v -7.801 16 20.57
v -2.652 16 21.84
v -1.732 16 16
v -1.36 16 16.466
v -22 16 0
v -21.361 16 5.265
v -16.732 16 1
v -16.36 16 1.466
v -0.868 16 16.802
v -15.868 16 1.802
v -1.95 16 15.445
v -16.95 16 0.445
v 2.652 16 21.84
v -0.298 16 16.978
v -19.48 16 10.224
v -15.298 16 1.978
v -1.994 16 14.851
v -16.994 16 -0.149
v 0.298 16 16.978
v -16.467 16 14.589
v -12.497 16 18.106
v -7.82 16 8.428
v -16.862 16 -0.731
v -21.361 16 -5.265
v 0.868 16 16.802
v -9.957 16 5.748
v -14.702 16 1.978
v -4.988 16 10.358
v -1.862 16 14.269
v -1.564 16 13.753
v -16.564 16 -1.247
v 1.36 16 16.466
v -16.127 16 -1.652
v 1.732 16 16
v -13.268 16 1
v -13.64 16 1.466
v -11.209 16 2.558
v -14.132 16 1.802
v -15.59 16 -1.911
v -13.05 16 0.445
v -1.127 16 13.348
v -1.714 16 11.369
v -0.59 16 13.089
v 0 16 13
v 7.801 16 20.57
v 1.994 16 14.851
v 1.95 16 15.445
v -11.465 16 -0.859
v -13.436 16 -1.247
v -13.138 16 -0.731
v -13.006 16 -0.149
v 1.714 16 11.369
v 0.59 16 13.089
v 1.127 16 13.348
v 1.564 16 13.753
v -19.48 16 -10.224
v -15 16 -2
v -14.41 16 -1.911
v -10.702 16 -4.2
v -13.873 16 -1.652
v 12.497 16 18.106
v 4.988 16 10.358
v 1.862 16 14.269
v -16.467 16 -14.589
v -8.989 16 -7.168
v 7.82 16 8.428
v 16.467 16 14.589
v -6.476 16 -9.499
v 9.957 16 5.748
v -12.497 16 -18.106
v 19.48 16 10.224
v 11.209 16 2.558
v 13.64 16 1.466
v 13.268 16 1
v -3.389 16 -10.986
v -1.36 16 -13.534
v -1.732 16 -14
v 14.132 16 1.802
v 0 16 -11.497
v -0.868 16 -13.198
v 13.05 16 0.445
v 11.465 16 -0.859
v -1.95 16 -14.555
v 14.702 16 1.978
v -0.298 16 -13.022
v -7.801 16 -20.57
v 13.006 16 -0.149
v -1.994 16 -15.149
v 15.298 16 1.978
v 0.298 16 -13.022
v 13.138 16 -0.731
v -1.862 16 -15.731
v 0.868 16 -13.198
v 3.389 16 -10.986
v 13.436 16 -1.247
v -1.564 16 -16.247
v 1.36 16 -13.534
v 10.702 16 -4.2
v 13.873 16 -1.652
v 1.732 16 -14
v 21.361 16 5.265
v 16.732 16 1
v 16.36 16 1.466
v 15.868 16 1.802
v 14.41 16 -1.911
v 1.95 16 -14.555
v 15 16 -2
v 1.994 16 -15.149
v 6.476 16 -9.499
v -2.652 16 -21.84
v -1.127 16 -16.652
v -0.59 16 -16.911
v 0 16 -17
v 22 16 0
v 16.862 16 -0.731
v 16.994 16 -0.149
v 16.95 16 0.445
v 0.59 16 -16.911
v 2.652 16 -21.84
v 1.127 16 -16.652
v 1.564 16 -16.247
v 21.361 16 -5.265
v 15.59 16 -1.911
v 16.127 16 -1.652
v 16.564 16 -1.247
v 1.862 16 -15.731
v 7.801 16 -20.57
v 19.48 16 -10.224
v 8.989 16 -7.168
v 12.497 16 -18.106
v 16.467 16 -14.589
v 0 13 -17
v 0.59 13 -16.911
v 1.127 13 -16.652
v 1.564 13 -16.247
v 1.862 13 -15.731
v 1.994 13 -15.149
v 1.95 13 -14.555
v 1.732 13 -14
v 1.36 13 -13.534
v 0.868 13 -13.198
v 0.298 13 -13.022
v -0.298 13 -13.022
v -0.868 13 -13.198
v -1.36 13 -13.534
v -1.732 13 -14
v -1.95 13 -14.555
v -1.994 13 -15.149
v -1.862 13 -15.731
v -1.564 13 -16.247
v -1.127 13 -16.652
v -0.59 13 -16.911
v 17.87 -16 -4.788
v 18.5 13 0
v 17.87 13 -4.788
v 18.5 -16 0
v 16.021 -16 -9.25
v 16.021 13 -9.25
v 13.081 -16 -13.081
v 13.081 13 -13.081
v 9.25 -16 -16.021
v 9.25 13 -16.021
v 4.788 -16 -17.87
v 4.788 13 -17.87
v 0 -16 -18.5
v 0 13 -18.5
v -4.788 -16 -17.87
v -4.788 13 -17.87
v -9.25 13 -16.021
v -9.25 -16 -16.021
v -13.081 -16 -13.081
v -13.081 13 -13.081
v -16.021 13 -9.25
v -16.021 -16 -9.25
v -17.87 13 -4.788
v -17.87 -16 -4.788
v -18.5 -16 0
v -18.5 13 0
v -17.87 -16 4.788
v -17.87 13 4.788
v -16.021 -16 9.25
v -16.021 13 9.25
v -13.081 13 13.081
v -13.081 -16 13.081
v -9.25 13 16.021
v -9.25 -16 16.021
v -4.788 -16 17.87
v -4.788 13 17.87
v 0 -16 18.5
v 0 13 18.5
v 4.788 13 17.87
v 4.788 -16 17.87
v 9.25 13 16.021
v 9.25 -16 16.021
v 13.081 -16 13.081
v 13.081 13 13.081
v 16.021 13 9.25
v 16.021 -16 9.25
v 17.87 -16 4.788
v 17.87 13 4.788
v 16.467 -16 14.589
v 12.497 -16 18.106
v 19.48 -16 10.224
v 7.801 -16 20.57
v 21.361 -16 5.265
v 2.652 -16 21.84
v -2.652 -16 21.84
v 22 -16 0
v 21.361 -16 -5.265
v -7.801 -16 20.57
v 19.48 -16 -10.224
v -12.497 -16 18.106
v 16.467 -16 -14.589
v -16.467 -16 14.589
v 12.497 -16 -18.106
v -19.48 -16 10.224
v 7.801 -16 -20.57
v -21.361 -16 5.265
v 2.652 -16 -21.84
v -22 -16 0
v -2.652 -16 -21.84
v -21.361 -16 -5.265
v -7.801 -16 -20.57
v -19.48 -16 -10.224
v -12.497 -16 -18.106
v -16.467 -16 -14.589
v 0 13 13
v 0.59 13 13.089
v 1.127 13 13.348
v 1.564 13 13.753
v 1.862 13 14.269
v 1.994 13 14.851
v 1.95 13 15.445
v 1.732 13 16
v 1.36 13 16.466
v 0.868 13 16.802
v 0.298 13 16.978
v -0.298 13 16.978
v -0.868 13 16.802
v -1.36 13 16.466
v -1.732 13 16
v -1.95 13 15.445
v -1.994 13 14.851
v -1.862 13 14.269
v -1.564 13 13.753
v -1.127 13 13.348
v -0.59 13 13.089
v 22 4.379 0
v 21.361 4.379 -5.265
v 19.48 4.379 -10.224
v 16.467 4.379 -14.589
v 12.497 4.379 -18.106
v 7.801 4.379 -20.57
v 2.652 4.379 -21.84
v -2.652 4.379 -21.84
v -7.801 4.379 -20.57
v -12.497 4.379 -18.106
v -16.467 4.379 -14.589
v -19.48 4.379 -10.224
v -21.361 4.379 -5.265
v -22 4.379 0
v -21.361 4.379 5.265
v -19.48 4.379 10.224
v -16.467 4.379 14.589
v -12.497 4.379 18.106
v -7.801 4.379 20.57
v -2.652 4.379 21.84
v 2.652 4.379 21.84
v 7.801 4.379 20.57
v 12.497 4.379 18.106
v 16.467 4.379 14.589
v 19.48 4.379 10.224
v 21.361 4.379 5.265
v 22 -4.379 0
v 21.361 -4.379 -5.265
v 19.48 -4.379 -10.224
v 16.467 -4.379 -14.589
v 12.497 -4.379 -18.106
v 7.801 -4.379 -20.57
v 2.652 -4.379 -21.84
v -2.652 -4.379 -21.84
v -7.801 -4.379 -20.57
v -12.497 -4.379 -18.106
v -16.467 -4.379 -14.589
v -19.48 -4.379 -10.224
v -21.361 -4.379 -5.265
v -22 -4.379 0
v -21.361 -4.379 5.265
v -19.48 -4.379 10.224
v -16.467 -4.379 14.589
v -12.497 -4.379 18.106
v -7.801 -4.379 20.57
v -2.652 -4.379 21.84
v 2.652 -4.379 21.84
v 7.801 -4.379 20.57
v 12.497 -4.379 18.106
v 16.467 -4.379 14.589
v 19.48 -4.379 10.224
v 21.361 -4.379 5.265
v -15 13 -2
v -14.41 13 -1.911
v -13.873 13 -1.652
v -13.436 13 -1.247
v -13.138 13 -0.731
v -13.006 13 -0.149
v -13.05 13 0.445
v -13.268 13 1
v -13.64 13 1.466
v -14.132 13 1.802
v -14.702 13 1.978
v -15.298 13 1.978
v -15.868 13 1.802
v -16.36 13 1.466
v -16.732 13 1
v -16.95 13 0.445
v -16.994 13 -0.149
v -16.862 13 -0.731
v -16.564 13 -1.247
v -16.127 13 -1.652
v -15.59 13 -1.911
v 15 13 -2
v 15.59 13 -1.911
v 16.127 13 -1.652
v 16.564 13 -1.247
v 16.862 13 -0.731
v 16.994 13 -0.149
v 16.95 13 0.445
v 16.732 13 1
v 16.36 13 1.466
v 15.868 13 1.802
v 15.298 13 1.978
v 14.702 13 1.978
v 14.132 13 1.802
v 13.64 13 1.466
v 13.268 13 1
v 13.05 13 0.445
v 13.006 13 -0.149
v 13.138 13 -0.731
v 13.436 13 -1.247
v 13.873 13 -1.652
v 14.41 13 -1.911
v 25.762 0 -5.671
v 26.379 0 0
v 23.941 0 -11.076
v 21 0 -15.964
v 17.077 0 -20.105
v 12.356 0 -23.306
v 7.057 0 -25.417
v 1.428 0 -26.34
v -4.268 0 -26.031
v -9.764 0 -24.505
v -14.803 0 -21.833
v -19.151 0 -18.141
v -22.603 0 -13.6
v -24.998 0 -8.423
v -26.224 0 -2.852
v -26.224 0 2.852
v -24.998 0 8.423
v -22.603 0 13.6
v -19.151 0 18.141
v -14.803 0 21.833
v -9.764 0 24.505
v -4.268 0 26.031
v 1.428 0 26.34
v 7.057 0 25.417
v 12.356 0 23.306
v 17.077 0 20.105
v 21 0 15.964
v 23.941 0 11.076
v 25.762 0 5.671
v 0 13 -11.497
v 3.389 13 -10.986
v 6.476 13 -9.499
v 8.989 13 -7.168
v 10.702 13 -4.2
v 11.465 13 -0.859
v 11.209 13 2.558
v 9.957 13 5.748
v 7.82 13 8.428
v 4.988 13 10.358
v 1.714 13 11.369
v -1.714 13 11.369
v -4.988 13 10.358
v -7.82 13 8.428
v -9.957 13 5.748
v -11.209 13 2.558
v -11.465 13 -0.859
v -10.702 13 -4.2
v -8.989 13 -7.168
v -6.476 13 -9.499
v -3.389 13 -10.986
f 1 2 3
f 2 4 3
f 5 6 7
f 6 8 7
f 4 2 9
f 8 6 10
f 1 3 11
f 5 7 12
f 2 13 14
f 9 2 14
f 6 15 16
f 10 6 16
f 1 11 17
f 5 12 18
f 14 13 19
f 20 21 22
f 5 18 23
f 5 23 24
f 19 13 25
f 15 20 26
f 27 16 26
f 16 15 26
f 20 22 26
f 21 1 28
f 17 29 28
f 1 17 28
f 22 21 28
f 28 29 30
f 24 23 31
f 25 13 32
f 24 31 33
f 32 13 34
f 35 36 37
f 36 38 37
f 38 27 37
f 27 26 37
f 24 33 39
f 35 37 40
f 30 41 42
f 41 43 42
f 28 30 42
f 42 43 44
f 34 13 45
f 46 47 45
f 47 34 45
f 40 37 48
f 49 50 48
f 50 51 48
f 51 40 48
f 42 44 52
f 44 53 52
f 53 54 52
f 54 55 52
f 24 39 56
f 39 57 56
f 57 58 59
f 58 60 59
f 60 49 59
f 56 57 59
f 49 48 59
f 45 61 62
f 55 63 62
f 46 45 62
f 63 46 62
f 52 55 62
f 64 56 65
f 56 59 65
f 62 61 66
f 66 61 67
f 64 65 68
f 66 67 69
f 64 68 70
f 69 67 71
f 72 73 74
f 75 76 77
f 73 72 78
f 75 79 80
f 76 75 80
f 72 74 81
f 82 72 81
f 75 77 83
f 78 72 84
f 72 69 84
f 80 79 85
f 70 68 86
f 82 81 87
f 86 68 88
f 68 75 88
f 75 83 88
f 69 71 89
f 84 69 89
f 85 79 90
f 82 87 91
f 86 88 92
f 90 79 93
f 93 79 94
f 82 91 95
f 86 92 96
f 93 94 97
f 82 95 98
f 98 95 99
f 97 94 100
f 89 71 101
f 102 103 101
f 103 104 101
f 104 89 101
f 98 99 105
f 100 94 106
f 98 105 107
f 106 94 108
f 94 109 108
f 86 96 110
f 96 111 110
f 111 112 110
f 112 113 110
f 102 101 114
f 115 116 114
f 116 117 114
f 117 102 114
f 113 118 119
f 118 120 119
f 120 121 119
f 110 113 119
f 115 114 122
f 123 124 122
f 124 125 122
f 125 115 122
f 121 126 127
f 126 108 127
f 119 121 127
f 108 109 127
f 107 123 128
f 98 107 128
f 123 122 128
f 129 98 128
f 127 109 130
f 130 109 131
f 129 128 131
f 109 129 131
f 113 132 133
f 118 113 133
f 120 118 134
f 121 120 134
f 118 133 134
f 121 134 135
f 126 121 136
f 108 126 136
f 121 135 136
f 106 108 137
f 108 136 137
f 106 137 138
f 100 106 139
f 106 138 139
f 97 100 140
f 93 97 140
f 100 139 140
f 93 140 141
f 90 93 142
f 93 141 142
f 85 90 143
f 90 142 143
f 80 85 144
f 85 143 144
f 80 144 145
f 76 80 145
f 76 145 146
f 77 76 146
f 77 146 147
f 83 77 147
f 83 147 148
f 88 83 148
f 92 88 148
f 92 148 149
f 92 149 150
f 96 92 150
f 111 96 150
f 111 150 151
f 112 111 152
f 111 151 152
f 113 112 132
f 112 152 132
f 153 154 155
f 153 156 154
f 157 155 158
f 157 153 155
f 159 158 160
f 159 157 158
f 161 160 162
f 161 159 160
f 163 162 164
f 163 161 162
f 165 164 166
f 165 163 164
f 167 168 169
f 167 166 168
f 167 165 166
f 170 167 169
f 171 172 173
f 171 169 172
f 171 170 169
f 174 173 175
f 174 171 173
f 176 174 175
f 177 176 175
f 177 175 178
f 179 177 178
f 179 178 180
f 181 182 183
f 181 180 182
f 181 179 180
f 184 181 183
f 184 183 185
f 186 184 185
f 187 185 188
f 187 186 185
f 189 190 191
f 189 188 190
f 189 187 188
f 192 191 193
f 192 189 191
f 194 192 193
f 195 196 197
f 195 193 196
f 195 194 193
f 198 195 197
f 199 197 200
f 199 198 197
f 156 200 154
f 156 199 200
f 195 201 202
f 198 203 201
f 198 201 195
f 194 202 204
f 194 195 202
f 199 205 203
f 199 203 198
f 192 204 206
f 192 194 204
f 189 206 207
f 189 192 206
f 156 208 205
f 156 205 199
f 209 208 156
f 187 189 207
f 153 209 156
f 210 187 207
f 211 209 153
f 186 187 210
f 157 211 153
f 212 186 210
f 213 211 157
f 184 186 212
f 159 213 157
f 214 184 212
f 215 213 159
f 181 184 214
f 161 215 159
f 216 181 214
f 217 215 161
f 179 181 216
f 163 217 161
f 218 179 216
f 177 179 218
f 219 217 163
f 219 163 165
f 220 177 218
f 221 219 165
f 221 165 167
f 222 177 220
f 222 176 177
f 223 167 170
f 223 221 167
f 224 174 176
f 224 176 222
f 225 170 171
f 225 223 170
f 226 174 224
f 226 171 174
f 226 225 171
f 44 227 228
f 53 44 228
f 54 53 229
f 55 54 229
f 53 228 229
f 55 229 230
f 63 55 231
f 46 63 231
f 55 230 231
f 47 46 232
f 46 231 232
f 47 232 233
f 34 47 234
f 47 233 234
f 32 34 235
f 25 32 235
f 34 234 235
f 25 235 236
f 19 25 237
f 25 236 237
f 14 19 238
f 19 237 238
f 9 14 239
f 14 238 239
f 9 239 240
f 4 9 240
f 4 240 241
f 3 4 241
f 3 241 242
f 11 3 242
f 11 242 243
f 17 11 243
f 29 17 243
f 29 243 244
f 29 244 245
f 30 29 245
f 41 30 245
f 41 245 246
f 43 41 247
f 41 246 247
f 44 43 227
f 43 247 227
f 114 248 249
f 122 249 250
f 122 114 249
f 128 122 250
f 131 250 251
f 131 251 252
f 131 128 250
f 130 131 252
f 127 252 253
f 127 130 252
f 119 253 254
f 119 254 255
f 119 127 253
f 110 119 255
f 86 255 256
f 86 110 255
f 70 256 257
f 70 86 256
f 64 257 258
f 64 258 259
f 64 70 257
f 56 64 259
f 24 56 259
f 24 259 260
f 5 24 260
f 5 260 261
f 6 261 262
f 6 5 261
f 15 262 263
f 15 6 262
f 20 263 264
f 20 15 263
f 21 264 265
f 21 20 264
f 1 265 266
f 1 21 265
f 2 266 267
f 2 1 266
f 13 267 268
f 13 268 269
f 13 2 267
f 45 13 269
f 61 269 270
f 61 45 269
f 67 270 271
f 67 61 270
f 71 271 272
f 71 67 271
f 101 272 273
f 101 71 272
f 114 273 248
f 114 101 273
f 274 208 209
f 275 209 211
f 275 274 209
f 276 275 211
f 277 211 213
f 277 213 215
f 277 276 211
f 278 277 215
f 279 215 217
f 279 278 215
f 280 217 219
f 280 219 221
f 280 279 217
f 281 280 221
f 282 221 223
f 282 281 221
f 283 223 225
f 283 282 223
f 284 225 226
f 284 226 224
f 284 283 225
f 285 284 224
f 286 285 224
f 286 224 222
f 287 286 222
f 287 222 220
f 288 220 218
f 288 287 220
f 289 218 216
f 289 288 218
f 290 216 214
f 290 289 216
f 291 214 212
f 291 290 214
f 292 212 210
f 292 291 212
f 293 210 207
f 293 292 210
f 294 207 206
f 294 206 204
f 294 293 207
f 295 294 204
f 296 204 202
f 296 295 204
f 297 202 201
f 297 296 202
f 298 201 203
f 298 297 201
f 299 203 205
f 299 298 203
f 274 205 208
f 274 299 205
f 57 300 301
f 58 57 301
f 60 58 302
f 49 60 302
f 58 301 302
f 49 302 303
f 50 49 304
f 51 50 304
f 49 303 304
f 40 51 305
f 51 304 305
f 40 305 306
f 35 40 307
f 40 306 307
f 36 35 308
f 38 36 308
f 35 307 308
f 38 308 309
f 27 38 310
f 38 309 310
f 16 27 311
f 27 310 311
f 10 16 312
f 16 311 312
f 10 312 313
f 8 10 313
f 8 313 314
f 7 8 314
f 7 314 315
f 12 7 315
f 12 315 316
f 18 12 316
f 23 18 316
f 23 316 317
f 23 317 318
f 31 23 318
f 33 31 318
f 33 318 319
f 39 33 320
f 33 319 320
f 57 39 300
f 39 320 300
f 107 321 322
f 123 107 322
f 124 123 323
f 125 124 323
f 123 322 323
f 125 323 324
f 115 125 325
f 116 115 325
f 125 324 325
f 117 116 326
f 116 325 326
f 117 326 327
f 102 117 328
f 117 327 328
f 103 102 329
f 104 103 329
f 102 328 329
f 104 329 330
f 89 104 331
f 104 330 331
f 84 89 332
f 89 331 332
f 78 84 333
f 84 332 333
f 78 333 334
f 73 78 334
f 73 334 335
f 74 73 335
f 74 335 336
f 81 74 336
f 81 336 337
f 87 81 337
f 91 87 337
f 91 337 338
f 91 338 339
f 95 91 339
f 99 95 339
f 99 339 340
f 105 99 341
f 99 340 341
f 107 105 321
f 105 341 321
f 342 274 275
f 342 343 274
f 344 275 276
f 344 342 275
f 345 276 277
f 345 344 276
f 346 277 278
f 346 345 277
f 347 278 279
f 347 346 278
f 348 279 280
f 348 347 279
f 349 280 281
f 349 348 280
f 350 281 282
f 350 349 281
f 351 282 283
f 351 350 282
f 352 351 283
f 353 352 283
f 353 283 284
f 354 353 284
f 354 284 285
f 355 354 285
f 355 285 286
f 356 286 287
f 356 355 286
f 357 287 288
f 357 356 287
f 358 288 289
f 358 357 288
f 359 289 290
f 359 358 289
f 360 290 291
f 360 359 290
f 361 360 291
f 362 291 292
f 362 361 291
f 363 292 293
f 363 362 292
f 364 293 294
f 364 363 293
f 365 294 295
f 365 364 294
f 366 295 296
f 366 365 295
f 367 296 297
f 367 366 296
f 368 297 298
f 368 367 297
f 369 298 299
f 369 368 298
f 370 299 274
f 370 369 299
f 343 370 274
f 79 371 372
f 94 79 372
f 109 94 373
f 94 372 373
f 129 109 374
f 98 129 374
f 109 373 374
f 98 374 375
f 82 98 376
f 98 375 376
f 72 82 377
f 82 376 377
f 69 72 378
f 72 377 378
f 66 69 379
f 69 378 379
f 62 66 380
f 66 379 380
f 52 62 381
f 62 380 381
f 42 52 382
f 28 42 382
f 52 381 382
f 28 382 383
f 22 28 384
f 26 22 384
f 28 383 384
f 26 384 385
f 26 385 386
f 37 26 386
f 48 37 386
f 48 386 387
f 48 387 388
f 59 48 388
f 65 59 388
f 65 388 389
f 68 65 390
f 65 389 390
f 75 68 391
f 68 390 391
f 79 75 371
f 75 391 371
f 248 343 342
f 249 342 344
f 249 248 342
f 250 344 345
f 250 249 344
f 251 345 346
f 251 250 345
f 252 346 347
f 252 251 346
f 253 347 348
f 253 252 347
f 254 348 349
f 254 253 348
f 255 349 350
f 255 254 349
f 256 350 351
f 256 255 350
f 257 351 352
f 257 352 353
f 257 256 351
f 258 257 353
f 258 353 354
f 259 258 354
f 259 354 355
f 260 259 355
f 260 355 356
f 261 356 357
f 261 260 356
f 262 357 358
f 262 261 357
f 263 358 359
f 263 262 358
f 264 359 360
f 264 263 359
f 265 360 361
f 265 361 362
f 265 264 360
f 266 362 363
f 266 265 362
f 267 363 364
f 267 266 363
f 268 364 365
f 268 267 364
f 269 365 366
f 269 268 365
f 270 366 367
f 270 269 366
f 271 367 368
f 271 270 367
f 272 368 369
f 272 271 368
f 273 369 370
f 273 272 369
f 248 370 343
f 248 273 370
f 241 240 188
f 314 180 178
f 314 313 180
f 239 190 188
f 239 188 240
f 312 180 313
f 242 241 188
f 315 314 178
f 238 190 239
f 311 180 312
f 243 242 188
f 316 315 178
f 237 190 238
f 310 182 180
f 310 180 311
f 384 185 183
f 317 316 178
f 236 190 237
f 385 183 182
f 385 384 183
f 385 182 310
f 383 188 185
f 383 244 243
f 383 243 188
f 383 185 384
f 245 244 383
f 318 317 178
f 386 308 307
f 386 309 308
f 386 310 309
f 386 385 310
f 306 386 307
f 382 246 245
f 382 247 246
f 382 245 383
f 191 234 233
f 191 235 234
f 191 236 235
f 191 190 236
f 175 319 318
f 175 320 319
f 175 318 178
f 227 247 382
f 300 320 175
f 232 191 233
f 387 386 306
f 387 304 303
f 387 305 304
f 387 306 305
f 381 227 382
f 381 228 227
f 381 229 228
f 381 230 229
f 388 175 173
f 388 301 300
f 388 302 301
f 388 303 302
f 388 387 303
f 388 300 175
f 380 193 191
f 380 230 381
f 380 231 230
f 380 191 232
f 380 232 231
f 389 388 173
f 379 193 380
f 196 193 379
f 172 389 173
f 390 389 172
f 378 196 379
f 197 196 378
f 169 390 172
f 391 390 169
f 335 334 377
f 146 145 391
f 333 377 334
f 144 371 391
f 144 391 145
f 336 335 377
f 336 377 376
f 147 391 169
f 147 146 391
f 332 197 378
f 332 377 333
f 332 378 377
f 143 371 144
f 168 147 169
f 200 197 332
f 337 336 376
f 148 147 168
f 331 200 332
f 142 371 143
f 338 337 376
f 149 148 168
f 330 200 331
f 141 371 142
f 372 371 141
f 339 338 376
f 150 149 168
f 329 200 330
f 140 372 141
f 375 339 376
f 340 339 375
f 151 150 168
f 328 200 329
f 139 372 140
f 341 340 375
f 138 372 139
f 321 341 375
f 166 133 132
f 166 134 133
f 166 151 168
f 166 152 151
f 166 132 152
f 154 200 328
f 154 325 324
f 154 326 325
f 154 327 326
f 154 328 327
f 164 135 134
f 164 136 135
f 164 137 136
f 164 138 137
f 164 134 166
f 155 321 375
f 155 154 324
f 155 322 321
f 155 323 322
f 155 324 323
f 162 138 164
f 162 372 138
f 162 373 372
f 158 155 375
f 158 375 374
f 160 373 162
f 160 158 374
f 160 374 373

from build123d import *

# Parameters (mm, degrees)
BOSS_EXTRUDE2_START = 3
SKETCH3_R           = 18.5
SKETCH3_R_2         = 2
SKETCH3_R_3         = 11.496935192
BOSS_EXTRUDE2_DEPTH = 3


# Read off the part's stored shape, not the designer's step: Revolve1
with BuildPart() as part:
    # Revolve1 outline → Revolve1 (revolve)
    with BuildSketch(Plane.XY):
        Polygon((26.378679656, 0), (22, 4.378679656), (22, 16), (18.5, 16), (18.5, -16), (22, -16), (22, -4.378679656), align=None)
    revolve(axis=Axis((0, 0, 0), (0, 1, 0)))

    # Sketch3 → Boss-Extrude2 (add)
    with BuildSketch(Plane.XZ.offset(-16).offset(BOSS_EXTRUDE2_START)):
        with Locations(Location((0, 0, 0), (0, 0, 270))):
            Circle(SKETCH3_R)
        with Locations(Location((15, 0, 0), (0, 0, 270))):
            Circle(SKETCH3_R_2, mode=Mode.SUBTRACT)
        with Locations(Location((0, 0, 0), (0, 0, 270))):
            Circle(SKETCH3_R_3, mode=Mode.SUBTRACT)
        with Locations(Location((0, -15, 0), (0, 0, 270))):
            Circle(SKETCH3_R_2, mode=Mode.SUBTRACT)
        with Locations(Location((-15, 0, 0), (0, 0, 270))):
            Circle(SKETCH3_R_2, mode=Mode.SUBTRACT)
        with Locations(Location((0, 15, 0), (0, 0, 270))):
            Circle(SKETCH3_R_2, mode=Mode.SUBTRACT)
    extrude(amount=-BOSS_EXTRUDE2_DEPTH)


solid = part.part
